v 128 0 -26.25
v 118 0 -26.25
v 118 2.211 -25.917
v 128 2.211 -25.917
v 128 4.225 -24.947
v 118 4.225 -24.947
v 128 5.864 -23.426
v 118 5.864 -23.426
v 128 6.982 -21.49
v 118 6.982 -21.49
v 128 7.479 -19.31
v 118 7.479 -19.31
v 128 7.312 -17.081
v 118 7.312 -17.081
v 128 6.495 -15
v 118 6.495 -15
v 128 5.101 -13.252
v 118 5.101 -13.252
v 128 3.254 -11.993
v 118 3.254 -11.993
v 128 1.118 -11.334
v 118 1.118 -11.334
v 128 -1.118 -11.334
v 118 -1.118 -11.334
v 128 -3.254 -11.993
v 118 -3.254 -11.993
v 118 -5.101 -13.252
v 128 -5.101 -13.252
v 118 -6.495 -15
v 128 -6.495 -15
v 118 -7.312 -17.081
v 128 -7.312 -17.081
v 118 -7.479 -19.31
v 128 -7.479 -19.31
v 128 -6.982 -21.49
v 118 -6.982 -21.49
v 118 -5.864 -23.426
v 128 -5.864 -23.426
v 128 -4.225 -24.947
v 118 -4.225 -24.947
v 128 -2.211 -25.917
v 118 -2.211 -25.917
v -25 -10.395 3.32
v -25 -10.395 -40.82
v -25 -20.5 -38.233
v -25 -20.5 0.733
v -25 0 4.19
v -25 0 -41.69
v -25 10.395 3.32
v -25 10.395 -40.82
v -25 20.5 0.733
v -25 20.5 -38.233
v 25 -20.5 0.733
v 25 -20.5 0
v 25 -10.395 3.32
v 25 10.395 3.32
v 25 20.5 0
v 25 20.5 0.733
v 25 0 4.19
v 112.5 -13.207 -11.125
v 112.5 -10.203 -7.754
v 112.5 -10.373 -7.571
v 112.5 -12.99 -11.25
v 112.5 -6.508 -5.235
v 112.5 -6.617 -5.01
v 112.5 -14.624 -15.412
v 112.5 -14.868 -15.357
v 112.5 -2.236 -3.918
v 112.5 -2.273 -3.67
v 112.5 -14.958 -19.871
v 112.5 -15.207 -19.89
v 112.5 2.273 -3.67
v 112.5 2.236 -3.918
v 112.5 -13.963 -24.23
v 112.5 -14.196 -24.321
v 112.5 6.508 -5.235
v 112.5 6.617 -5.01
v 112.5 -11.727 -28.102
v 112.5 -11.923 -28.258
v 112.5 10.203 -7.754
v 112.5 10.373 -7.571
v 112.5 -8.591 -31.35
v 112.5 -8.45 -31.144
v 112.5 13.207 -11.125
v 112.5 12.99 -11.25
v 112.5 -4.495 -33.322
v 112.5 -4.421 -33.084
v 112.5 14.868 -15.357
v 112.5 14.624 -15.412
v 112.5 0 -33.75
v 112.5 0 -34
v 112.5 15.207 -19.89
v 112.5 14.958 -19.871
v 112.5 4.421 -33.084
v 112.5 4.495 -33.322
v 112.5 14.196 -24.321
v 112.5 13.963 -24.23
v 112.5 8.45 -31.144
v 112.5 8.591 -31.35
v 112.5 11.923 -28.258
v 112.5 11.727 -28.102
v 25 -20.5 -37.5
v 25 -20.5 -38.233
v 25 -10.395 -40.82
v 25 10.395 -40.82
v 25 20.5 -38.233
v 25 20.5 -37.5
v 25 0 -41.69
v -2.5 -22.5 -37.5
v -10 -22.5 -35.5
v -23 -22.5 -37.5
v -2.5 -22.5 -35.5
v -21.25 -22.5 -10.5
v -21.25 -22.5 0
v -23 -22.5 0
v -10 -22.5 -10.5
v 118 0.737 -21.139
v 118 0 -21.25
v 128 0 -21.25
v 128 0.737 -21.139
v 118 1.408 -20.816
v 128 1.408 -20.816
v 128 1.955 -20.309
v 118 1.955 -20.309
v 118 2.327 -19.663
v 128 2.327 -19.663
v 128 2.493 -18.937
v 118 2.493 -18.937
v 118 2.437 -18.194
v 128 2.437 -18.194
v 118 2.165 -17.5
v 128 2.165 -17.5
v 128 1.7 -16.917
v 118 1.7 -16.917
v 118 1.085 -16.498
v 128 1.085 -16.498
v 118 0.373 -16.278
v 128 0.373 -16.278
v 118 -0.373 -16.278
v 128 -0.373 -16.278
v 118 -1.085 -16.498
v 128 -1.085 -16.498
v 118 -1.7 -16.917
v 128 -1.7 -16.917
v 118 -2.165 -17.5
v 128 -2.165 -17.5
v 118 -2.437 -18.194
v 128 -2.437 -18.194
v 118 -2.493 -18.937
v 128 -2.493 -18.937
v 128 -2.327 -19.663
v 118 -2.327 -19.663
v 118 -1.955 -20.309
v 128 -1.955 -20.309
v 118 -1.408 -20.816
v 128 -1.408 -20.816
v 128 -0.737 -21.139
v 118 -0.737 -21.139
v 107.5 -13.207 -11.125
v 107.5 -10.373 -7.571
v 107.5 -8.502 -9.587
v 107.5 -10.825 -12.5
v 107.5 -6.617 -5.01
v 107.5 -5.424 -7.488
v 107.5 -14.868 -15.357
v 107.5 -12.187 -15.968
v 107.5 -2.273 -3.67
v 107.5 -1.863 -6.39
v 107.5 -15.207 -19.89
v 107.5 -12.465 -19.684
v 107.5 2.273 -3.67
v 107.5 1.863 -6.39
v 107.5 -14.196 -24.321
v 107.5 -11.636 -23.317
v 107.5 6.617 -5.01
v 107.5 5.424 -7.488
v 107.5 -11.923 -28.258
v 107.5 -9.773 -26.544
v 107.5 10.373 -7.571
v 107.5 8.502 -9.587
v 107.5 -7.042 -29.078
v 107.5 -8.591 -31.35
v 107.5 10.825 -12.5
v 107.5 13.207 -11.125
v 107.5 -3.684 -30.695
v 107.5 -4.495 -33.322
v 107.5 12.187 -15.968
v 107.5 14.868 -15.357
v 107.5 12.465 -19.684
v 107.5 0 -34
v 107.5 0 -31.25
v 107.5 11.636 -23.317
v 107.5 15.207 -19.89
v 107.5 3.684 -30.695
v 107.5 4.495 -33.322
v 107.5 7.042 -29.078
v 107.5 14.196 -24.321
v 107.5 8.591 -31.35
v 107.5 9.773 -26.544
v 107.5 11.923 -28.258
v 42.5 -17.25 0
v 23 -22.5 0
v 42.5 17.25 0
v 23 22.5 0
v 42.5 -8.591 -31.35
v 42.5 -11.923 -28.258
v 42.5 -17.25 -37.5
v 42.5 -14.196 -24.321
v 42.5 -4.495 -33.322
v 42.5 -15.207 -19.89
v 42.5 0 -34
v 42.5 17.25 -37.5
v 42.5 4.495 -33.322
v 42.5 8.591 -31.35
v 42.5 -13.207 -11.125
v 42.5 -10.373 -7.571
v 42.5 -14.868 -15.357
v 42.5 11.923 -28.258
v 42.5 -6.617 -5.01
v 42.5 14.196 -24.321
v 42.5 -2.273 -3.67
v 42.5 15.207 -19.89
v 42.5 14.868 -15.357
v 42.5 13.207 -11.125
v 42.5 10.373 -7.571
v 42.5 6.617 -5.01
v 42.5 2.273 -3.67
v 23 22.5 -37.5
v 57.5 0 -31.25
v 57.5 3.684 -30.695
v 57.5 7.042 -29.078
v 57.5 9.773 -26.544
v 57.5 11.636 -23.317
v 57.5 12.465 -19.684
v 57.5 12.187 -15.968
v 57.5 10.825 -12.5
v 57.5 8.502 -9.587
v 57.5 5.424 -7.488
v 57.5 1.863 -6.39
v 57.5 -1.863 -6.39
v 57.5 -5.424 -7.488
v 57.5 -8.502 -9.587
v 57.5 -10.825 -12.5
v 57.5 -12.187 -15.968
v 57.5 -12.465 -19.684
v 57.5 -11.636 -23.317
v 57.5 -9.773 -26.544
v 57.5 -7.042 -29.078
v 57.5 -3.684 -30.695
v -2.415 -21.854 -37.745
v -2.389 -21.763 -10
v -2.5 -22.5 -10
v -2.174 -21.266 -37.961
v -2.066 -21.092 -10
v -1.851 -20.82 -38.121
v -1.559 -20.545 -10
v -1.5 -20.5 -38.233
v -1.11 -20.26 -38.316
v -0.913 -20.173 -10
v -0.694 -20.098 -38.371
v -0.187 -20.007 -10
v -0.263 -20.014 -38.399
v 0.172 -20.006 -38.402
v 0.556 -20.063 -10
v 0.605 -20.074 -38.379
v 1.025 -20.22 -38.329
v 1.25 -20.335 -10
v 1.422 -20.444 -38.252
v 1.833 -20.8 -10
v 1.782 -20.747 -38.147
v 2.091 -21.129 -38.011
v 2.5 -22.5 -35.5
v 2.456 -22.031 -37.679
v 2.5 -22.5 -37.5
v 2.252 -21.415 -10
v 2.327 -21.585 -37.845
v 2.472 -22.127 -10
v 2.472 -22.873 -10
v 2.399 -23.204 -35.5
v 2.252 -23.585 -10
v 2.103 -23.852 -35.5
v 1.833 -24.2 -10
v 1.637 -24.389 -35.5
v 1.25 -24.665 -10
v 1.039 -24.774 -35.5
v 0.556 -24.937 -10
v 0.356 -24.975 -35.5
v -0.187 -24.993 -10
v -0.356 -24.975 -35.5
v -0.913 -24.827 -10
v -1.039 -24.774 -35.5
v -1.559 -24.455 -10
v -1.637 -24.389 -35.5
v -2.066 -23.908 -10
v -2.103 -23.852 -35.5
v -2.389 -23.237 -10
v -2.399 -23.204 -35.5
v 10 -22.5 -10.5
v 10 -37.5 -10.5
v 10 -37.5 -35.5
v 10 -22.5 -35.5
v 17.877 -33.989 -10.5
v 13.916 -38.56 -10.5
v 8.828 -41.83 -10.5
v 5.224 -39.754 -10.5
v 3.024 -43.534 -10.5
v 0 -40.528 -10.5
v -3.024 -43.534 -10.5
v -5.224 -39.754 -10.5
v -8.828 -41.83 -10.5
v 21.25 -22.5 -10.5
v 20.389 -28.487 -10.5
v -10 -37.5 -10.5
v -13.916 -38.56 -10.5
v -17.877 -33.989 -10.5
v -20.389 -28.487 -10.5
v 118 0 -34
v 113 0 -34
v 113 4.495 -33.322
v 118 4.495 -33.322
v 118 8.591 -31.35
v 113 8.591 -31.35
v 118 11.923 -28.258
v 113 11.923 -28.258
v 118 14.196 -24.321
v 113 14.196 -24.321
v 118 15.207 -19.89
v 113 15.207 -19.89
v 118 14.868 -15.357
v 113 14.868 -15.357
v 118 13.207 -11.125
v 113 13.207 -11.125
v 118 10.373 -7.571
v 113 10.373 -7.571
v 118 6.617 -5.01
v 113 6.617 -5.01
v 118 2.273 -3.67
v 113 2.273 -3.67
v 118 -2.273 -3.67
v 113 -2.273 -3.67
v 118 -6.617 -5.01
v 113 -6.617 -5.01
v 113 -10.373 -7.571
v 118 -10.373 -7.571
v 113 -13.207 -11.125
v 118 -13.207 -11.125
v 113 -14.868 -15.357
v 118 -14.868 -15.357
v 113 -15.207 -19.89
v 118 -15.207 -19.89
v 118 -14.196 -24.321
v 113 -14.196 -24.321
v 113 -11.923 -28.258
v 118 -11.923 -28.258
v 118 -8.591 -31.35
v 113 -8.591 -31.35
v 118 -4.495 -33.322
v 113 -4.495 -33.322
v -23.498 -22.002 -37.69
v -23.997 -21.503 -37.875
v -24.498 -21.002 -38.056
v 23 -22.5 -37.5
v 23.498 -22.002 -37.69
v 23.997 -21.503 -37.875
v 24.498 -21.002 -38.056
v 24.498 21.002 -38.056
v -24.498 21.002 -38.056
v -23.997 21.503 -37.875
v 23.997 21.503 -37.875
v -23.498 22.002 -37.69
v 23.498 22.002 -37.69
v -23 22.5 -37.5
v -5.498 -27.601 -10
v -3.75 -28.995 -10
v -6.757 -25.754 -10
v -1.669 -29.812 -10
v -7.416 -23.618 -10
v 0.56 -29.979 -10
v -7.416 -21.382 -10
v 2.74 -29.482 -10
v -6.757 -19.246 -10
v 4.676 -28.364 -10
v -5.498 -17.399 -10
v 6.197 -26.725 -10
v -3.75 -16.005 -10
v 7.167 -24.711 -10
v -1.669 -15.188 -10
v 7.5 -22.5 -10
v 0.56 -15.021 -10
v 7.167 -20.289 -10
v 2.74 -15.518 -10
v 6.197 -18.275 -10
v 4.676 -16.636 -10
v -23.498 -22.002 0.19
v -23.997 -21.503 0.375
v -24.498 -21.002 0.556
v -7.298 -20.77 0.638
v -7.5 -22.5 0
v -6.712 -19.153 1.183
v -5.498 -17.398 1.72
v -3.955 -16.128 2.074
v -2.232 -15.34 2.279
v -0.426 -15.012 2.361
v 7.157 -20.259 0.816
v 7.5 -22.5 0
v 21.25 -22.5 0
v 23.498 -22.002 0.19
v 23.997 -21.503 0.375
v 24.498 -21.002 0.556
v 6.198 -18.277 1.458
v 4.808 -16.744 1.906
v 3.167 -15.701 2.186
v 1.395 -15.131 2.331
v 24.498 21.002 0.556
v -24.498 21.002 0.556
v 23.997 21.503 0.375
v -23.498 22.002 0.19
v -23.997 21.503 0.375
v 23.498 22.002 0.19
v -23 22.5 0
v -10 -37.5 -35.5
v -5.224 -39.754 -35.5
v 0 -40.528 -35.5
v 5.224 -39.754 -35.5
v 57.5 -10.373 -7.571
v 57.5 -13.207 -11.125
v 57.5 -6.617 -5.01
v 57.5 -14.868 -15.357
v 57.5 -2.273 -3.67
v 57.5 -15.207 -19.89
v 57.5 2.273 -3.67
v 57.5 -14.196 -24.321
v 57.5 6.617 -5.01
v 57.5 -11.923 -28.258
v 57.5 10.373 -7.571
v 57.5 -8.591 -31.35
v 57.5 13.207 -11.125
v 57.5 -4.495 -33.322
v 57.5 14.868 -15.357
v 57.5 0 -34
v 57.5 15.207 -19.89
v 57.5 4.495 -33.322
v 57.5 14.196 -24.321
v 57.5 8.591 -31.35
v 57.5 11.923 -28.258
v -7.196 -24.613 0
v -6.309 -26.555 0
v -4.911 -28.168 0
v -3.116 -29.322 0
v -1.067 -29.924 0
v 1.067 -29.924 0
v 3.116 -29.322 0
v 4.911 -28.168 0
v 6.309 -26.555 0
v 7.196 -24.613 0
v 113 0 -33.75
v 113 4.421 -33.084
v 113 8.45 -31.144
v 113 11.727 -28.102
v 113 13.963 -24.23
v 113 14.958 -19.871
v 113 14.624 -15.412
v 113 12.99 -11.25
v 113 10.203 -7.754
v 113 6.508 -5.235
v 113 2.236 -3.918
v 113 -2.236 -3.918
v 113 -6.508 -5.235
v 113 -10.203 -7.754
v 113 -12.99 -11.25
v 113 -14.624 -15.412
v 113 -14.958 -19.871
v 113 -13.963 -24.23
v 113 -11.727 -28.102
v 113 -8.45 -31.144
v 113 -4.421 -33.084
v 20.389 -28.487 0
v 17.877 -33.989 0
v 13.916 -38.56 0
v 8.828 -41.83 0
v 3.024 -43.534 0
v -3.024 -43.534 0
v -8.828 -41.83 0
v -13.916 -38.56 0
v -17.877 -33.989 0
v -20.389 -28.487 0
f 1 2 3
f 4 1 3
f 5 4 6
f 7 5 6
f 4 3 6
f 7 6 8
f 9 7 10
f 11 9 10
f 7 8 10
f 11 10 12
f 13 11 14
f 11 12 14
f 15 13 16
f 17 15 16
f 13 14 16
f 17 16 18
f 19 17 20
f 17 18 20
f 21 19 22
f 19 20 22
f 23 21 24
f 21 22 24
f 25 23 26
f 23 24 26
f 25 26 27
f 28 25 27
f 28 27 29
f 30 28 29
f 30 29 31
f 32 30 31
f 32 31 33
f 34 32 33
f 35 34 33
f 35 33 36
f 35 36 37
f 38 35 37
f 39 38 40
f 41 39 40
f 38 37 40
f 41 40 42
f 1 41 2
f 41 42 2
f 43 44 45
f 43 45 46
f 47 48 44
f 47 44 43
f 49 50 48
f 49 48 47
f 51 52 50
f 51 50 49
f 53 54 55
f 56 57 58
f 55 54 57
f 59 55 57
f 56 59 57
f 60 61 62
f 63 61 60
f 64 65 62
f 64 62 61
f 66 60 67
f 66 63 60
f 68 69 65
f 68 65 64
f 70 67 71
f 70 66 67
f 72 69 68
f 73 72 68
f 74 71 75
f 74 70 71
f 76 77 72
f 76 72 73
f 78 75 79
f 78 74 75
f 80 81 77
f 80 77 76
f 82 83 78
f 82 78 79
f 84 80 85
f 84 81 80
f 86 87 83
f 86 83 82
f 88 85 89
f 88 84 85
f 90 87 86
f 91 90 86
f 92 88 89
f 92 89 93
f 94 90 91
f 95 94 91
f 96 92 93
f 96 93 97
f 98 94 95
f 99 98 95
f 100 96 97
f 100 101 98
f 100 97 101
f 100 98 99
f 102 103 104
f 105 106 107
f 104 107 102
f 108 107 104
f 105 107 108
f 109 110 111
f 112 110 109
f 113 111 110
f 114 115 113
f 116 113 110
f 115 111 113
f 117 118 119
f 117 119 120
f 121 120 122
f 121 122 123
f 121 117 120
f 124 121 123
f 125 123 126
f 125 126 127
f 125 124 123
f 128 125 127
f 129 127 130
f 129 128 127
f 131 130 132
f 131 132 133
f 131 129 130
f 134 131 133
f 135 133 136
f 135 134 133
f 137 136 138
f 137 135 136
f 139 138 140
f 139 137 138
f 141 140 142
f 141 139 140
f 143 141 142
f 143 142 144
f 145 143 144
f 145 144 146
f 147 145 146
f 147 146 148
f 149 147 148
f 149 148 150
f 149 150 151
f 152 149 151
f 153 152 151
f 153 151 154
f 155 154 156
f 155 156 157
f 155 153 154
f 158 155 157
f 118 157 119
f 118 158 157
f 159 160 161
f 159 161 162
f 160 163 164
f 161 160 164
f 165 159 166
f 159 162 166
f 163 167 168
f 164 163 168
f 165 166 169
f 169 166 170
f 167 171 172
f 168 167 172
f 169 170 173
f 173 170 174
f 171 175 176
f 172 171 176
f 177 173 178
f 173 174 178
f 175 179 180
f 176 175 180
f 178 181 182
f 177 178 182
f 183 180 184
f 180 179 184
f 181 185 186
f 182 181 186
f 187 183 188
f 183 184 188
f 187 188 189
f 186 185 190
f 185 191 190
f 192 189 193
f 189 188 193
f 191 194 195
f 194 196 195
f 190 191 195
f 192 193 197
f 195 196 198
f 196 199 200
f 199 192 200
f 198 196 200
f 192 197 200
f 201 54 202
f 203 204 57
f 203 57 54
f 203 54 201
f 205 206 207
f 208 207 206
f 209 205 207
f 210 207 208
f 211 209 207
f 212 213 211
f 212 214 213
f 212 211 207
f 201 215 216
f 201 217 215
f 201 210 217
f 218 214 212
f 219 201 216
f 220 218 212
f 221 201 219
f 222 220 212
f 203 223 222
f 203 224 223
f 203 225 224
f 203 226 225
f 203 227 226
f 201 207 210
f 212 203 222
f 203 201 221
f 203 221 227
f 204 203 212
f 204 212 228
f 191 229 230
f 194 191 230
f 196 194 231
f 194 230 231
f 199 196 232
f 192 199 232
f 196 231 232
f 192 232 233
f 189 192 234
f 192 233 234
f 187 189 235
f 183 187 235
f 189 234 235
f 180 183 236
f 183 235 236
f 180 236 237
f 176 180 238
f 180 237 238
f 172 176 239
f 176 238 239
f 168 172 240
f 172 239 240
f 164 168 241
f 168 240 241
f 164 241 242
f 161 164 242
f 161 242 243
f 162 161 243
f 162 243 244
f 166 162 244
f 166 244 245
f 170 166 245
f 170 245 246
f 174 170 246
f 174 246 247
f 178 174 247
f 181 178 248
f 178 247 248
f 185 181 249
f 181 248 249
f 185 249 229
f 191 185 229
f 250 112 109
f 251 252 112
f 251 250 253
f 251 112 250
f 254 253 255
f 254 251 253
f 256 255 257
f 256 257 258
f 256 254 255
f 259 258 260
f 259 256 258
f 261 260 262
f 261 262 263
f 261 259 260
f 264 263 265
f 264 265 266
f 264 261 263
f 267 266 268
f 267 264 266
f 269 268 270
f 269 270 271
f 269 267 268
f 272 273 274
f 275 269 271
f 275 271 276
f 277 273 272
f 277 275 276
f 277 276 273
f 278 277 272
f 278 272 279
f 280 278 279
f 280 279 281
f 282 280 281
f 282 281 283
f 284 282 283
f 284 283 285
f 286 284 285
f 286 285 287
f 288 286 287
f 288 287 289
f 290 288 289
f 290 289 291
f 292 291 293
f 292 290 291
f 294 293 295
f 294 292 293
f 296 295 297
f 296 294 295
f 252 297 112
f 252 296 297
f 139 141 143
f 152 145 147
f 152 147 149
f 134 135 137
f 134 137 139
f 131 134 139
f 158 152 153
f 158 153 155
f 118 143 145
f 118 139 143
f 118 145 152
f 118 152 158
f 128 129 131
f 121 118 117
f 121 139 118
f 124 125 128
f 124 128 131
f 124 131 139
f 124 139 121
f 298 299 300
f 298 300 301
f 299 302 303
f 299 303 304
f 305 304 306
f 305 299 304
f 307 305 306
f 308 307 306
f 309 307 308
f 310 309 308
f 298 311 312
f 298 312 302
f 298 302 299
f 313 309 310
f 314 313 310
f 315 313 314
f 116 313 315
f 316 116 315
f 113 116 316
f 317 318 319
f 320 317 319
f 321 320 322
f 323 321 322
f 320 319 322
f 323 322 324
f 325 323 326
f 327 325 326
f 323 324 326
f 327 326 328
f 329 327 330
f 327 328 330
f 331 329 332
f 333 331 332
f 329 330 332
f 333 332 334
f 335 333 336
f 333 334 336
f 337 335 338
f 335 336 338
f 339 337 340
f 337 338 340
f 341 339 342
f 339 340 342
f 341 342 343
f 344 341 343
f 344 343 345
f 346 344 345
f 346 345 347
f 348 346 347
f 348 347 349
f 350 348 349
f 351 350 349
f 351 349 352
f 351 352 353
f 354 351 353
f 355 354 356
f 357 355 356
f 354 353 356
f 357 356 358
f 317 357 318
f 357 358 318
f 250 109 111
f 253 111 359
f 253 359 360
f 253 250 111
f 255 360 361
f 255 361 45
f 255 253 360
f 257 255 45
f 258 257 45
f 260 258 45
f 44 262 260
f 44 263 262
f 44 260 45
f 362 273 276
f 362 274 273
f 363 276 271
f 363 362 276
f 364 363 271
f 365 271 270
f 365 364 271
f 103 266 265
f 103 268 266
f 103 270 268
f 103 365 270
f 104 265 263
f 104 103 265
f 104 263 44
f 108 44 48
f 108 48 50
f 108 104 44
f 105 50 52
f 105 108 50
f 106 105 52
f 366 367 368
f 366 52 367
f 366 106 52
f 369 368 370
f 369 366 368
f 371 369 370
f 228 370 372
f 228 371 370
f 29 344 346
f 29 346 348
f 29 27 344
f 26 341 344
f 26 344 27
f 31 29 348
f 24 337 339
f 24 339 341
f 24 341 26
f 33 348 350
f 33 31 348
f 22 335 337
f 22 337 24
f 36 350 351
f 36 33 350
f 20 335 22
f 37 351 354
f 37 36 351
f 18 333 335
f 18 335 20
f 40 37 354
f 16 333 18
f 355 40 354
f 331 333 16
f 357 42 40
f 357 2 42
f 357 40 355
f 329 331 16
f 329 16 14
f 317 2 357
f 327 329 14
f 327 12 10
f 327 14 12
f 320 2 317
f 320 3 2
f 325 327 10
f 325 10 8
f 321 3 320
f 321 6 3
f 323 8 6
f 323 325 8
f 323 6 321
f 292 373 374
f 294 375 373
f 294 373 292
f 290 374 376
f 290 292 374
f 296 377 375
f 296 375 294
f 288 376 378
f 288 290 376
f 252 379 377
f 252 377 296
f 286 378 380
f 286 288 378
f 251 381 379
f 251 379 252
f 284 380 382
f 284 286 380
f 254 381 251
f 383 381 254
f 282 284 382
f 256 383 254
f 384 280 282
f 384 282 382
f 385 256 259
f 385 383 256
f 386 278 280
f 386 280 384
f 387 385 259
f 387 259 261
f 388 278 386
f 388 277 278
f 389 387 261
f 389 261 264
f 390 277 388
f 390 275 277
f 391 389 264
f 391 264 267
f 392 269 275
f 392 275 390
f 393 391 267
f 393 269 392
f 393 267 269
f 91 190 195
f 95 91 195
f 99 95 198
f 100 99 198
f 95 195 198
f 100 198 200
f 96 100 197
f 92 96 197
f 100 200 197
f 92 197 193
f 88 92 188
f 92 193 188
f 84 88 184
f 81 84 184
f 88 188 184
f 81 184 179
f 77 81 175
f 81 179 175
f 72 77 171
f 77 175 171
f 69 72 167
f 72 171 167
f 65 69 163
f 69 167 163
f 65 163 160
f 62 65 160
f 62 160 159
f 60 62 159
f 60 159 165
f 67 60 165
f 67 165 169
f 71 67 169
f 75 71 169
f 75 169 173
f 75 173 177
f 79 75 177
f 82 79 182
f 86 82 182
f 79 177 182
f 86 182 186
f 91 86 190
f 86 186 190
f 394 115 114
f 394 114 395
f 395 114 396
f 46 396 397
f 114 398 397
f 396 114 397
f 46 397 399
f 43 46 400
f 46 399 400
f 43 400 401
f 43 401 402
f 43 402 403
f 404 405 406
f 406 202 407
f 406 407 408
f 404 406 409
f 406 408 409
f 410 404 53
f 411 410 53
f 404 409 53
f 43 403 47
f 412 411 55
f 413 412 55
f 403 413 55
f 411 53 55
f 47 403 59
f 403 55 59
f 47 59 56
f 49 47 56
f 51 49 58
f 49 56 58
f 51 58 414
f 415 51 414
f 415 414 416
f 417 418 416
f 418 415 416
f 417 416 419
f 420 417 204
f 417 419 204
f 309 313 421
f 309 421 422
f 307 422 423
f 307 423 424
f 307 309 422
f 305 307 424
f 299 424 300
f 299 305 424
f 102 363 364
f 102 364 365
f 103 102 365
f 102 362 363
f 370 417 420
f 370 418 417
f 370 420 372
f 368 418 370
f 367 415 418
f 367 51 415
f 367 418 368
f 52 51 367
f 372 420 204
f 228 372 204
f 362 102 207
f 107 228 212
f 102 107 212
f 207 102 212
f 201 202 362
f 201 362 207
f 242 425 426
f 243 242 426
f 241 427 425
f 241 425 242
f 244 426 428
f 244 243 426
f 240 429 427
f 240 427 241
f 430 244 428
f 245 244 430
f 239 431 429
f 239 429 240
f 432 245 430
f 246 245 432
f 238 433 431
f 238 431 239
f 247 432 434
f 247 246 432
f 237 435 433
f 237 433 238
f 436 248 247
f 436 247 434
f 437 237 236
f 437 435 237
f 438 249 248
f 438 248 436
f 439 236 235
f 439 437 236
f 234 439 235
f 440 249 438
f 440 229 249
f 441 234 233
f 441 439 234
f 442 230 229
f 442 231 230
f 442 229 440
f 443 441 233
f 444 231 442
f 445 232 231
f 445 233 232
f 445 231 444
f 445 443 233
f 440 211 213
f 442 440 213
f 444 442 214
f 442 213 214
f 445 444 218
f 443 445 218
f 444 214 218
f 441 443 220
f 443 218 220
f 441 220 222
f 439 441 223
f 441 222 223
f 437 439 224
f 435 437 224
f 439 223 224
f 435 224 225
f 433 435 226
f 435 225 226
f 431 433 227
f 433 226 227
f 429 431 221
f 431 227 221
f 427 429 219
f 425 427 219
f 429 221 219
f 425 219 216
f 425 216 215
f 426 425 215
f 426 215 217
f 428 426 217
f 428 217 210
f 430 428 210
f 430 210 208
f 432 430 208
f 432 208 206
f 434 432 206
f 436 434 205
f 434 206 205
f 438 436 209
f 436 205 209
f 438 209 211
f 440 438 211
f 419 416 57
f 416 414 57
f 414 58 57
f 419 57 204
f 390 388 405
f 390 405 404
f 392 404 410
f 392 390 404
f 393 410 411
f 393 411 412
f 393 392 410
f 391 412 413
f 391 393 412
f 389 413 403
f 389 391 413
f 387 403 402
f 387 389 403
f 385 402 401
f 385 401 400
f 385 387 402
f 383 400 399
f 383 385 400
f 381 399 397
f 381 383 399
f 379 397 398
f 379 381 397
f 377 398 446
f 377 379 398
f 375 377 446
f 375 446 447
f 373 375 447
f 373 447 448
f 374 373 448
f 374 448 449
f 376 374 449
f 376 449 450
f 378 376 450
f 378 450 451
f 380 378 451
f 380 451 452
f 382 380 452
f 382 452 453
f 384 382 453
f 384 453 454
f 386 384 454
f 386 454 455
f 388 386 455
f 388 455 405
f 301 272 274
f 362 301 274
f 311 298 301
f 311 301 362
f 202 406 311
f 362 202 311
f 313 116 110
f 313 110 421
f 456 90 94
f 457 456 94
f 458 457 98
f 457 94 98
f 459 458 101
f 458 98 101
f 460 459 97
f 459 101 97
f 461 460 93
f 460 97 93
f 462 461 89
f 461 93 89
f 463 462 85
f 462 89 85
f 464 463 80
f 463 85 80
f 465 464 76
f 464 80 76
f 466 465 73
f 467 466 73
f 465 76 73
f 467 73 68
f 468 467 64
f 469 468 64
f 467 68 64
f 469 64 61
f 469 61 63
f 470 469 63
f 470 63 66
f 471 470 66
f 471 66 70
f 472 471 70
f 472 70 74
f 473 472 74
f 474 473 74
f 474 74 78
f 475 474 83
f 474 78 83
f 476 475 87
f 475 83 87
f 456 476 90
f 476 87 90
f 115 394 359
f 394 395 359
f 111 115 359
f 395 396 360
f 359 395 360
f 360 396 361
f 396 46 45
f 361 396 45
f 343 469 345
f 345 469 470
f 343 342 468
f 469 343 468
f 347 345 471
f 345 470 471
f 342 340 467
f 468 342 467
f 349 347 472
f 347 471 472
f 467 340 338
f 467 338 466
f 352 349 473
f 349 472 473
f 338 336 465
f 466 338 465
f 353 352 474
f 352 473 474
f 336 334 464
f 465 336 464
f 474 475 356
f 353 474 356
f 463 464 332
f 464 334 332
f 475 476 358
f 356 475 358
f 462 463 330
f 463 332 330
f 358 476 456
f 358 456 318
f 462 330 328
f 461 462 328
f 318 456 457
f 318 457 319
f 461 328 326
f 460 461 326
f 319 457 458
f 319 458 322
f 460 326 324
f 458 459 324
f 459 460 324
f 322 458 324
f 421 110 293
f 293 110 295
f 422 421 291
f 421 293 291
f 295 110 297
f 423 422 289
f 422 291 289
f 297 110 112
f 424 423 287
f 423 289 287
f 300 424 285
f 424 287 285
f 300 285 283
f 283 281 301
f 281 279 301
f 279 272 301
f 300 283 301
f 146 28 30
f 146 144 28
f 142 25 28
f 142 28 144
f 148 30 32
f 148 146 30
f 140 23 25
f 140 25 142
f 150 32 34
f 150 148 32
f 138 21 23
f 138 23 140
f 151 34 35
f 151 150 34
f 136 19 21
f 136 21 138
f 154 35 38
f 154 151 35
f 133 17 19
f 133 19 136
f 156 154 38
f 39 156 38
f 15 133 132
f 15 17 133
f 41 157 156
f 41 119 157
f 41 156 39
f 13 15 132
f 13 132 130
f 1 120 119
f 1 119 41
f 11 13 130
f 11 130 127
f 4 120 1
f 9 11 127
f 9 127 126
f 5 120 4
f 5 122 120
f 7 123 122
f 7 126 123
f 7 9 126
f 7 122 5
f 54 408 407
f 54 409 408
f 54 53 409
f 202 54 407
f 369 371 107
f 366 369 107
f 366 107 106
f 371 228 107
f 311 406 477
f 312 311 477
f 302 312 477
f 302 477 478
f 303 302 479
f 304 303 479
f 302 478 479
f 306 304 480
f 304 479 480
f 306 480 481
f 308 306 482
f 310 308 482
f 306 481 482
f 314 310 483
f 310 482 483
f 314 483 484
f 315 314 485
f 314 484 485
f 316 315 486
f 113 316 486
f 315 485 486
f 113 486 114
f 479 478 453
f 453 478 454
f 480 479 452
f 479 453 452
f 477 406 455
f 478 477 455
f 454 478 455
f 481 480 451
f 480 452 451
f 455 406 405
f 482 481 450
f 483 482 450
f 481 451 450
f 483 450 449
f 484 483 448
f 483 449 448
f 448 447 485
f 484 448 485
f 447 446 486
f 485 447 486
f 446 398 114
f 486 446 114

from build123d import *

# Parameters (mm, degrees)
SKETCH2_W               = 50
SKETCH2_H               = 45
BOSS_EXTRUDE1_DEPTH     = 37.5
BOSS_EXTRUDE2_DEPTH     = 50
CHAMFER2_SIZE           = 2
BOSS_EXTRUDE3_DEPTH     = 10.5
BOSS_EXTRUDE4_DEPTH     = 25
CUT_EXTRUDE2_DEPTH      = 65.143563871
CUT_EXTRUDE2_DEPTH_BACK = 65.143563871
SKETCH10_R              = 2.5
BOSS_EXTRUDE6_DEPTH     = 37.5
SKETCH15_R              = 15.25
BOSS_EXTRUDE8_DEPTH     = 15
SKETCH16_R              = 12.5
BOSS_EXTRUDE9_DEPTH     = 50
SKETCH17_R              = 15.25
BOSS_EXTRUDE10_DEPTH    = 5
SKETCH18_R              = 15
BOSS_EXTRUDE11_DEPTH    = 0.5
SKETCH19_R              = 15.25
BOSS_EXTRUDE12_DEPTH    = 5
SKETCH20_R              = 7.5
SKETCH20_R_2            = 2.5
BOSS_EXTRUDE13_DEPTH    = 10
CUT_EXTRUDE3_DEPTH      = 142.549138883
CUT_EXTRUDE3_DEPTH_BACK = 10
SKETCH21_R              = 7.5


with BuildPart() as part:
    # Sketch2 → Boss-Extrude1 (new body)
    with BuildSketch(Plane.XY):
        Rectangle(SKETCH2_W, SKETCH2_H)
    extrude(amount=-BOSS_EXTRUDE1_DEPTH)

    # Sketch3 → Boss-Extrude2 (add, through all)
    with BuildSketch(Plane(origin=(25, 0, 0), x_dir=(0, 0, -1), z_dir=(1, 0, 0))):
        with BuildLine():
            Line((0, 22.5), (0, -22.5))
            ThreePointArc((0, -22.5), (-4.190481052, 0), (0, 22.5))
        make_face()
        with BuildLine():
            Line((37.5, 22.5), (37.5, -22.5))
            ThreePointArc((37.5, -22.5), (41.690481052, 0), (37.5, 22.5))
        make_face()
    extrude(amount=-BOSS_EXTRUDE2_DEPTH)

    # Chamfer2
    chamfer2_edges = [part.edges().sort_by_distance(p)[0] for p in [
        (25, -22.5, -18.75),
        (-25, -22.5, -18.75),
        (-25, 22.5, -18.75),
        (25, 22.5, -18.75),
    ]]
    chamfer(chamfer2_edges, length=CHAMFER2_SIZE)

    # Sketch7 → Boss-Extrude3 (add)
    with BuildSketch(Plane.XY):
        with BuildLine():
            Line((-21.25, -22.5), (21.25, -22.5))
            ThreePointArc((21.25, -22.5), (0, -43.75), (-21.25, -22.5))
        make_face()
    extrude(amount=-BOSS_EXTRUDE3_DEPTH)

    # Sketch8 → Boss-Extrude4 (add)
    with BuildSketch(Plane(origin=(0, 0, -10.5), x_dir=(-1, 0, 0), z_dir=(0, 0, -1))):
        with BuildLine():
            Line((-10, -22.5), (10, -22.5))
            Line((10, -22.5), (10, -37.5))
            ThreePointArc((10, -37.5), (0, -40.527756377), (-10, -37.5))
            Line((-10, -37.5), (-10, -22.5))
        make_face()
    extrude(amount=BOSS_EXTRUDE4_DEPTH)

    # Sketch10 → Cut-Extrude2 (cut, two sides: drawn at the far end of the back side and taken through both)
    with BuildSketch(Plane(origin=(0, 0, -35.5), x_dir=(-1, 0, 0), z_dir=(0, 0, -1)).offset(-CUT_EXTRUDE2_DEPTH_BACK)):
        with Locations((0, -22.5)):
            Circle(SKETCH10_R)
    extrude(amount=CUT_EXTRUDE2_DEPTH + CUT_EXTRUDE2_DEPTH_BACK, mode=Mode.SUBTRACT)

    # Sketch13 → Boss-Extrude6 (add)
    with BuildSketch(Plane.XY):
        Polygon((23, 22.5), (23, -22.5), (42.5, -17.25), (42.5, 0), (42.5, 17.25), align=None)
    extrude(amount=-BOSS_EXTRUDE6_DEPTH)

    # Sketch15 → Boss-Extrude8 (add)
    with BuildSketch(Plane(origin=(42.5, 0, 0), x_dir=(0, 0, -1), z_dir=(1, 0, 0))):
        with Locations((18.75, 0)):
            Circle(SKETCH15_R)
    extrude(amount=BOSS_EXTRUDE8_DEPTH)

    # Sketch16 → Boss-Extrude9 (add)
    with BuildSketch(Plane(origin=(57.5, 0, 0), x_dir=(0, 0, -1), z_dir=(1, 0, 0))):
        with Locations((18.75, 0)):
            Circle(SKETCH16_R)
    extrude(amount=BOSS_EXTRUDE9_DEPTH)

    # Sketch17 → Boss-Extrude10 (add)
    with BuildSketch(Plane(origin=(107.5, 0, 0), x_dir=(0, 0, -1), z_dir=(1, 0, 0))):
        with Locations((18.75, 0)):
            Circle(SKETCH17_R)
    extrude(amount=BOSS_EXTRUDE10_DEPTH)

    # Sketch18 → Boss-Extrude11 (add)
    with BuildSketch(Plane(origin=(112.5, 0, 0), x_dir=(0, 0, -1), z_dir=(1, 0, 0))):
        with Locations((18.75, 0)):
            Circle(SKETCH18_R)
    extrude(amount=BOSS_EXTRUDE11_DEPTH)

    # Sketch19 → Boss-Extrude12 (add)
    with BuildSketch(Plane(origin=(113, 0, 0), x_dir=(0, 0, -1), z_dir=(1, 0, 0))):
        with Locations((18.75, 0)):
            Circle(SKETCH19_R)
    extrude(amount=BOSS_EXTRUDE12_DEPTH)

    # Sketch20 → Boss-Extrude13 (add)
    with BuildSketch(Plane(origin=(118, 0, 0), x_dir=(0, 0, -1), z_dir=(1, 0, 0))):
        with Locations((18.75, 0)):
            Circle(SKETCH20_R)
        with Locations((18.75, 0)):
            Circle(SKETCH20_R_2, mode=Mode.SUBTRACT)
    extrude(amount=BOSS_EXTRUDE13_DEPTH)

    # Sketch21 → Cut-Extrude3 (cut, two sides: drawn at the far end of the back side and taken through both)
    with BuildSketch(Plane.XY.offset(-CUT_EXTRUDE3_DEPTH_BACK)):
        with Locations((0, -22.5)):
            Circle(SKETCH21_R)
    extrude(amount=CUT_EXTRUDE3_DEPTH + CUT_EXTRUDE3_DEPTH_BACK, mode=Mode.SUBTRACT)


solid = part.part
